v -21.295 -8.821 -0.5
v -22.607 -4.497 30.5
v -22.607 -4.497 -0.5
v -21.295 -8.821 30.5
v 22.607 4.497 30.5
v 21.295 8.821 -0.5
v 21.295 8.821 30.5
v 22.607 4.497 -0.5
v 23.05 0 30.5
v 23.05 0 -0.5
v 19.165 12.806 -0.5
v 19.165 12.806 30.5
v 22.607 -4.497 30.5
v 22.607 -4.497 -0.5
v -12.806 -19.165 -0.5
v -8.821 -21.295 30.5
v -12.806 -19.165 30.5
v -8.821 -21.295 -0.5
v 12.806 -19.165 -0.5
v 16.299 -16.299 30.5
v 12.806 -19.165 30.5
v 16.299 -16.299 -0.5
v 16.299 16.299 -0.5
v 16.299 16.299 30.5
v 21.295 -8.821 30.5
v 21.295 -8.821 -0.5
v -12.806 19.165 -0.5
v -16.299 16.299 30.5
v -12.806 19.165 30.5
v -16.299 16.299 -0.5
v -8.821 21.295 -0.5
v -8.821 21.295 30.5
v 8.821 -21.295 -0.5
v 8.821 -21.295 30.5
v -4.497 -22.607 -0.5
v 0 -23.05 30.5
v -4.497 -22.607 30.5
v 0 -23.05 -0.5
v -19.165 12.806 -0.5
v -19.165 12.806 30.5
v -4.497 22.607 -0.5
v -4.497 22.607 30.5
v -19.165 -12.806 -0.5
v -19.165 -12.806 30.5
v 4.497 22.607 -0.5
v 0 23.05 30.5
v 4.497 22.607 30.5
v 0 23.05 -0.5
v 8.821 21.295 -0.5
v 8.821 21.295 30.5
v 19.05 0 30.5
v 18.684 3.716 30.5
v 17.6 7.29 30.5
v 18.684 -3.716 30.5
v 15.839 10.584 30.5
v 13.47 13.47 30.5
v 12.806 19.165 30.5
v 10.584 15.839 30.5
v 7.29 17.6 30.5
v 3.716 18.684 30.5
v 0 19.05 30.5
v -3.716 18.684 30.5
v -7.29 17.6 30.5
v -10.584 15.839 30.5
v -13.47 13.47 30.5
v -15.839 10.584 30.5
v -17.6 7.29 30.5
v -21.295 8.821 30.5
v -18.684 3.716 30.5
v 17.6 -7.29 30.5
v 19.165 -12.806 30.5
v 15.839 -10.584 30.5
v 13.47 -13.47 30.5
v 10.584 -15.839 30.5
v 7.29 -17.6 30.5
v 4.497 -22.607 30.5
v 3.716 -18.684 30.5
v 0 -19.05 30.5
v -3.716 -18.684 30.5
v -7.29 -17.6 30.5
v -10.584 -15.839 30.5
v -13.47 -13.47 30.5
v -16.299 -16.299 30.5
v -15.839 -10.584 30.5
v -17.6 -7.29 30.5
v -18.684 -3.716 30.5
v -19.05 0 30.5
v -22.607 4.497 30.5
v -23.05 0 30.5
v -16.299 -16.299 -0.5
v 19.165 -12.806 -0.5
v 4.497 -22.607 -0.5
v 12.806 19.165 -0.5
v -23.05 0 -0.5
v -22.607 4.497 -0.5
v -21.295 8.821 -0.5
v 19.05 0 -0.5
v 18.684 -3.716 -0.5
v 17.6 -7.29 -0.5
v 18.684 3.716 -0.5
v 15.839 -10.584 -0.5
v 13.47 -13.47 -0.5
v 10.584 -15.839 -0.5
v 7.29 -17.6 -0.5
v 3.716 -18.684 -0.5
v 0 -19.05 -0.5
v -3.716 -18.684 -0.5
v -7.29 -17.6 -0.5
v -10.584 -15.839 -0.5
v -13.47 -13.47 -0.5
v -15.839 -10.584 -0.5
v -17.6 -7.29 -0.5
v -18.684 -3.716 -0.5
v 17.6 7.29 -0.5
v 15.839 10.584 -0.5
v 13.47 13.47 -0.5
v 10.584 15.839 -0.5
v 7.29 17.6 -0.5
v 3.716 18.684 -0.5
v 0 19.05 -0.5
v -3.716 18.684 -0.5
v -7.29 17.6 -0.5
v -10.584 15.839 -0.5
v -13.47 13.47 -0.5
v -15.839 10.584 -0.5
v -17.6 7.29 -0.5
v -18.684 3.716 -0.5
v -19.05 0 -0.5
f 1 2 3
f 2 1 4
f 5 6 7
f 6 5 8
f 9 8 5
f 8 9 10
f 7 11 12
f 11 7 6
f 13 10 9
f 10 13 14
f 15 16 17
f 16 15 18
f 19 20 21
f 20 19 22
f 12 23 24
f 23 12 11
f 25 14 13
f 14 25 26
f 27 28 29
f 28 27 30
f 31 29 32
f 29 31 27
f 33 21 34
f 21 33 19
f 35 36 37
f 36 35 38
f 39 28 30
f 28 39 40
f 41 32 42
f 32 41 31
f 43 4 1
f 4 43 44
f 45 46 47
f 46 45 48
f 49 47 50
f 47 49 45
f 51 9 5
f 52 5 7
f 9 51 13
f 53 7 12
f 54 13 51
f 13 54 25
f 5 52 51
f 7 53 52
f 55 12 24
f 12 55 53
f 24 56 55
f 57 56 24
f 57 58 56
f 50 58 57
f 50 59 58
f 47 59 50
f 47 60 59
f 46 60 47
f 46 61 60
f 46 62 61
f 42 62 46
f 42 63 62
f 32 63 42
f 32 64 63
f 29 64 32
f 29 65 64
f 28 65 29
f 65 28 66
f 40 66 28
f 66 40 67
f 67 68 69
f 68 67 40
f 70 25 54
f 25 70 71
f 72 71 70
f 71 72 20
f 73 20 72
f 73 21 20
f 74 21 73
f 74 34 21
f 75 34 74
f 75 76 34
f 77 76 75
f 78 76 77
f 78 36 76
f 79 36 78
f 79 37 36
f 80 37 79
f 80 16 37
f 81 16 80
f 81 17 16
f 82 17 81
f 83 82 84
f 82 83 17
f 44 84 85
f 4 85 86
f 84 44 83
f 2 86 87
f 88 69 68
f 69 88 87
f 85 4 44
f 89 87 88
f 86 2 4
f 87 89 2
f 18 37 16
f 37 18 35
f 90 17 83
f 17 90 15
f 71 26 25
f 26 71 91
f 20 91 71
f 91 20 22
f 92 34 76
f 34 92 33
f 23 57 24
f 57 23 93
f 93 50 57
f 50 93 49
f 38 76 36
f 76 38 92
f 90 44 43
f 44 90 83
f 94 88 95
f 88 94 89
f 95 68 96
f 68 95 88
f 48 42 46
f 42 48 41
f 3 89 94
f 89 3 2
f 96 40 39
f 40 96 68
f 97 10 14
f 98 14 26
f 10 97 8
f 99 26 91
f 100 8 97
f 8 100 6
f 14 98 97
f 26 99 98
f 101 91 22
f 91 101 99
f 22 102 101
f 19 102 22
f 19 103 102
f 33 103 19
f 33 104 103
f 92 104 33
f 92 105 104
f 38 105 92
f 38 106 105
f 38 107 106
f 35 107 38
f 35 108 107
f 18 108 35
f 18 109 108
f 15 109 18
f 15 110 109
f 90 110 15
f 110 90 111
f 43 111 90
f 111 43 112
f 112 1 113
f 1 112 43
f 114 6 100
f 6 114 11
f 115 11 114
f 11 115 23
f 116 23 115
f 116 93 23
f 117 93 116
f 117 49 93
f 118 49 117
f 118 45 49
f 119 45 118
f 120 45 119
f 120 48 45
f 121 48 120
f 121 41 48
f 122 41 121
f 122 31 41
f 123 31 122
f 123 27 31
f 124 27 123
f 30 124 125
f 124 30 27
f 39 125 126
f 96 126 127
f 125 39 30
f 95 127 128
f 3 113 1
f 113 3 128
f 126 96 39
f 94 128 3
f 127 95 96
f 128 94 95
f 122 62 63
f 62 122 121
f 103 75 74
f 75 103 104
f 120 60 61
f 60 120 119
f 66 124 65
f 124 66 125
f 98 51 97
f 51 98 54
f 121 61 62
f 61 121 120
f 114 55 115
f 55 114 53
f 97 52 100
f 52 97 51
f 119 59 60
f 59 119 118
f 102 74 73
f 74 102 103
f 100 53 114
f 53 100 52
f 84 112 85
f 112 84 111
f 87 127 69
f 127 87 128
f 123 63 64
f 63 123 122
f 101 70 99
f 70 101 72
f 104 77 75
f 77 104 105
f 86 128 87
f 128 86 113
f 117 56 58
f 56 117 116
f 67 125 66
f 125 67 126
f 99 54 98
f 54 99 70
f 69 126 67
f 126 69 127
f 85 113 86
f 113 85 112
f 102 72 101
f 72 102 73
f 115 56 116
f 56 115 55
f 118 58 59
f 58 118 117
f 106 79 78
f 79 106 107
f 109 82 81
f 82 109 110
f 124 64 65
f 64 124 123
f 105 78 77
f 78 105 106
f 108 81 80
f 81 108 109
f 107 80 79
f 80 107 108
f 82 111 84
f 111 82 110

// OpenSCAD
$fn = 32;

// ----------------------------------------------------------------------
// Two-module gear rim: z20 m2 and z18 m1.2, 30 mm wide
// ----------------------------------------------------------------------

// --- parameters (mm) ---
module_a = 2;             // first tooth module
teeth_a = 20;             // first band tooth count
module_b = 1.2;           // second tooth module
teeth_b = 18;             // second band tooth count
band_h = 12;              // height of one tooth band
web_t = 6;                // web thickness between the bands
total = 30;               // overall width over both bands
root_r = 17.5;            // root radius of the coarse band
hub_r = 23.05;            // hub radius
bore_d = 38.1;            // hub bore
hole_count = 6;           // lightening holes
hole_r = 11.98;           // lightening hole circle radius
hole_d = 4.96;            // lightening hole diameter

band_a = [[17.424, -1.631], [19.832, -1.598], [20.912, -1.227], [21.989, -0.695], [21.989, 0.695], [20.912, 1.227], [19.832, 1.598], [17.424, 1.631], [17.075, 3.833], [19.355, 4.609], [20.268, 5.295], [21.128, 6.134], [20.698, 7.456], [19.509, 7.629], [18.367, 7.648], [16.067, 6.935], [15.055, 8.922], [16.983, 10.364], [17.639, 11.299], [18.198, 12.363], [17.381, 13.487], [16.197, 13.284], [15.105, 12.949], [13.138, 11.561], [11.561, 13.138], [12.949, 15.105], [13.284, 16.197], [13.487, 17.381], [12.363, 18.198], [11.299, 17.639], [10.364, 16.983], [8.922, 15.055], [6.935, 16.067], [7.648, 18.367], [7.629, 19.509], [7.456, 20.698], [6.134, 21.128], [5.295, 20.268], [4.609, 19.355], [3.833, 17.075], [1.631, 17.424], [1.598, 19.832], [1.227, 20.912], [0.695, 21.989], [-0.695, 21.989], [-1.227, 20.912], [-1.598, 19.832], [-1.631, 17.424], [-3.833, 17.075], [-4.609, 19.355], [-5.295, 20.268], [-6.134, 21.128], [-7.456, 20.698], [-7.629, 19.509], [-7.648, 18.367], [-6.935, 16.067], [-8.922, 15.055], [-10.364, 16.983], [-11.299, 17.639], [-12.363, 18.198], [-13.487, 17.381], [-13.284, 16.197], [-12.949, 15.105], [-11.561, 13.138], [-13.138, 11.561], [-15.105, 12.949], [-16.197, 13.284], [-17.381, 13.487], [-18.198, 12.363], [-17.639, 11.299], [-16.983, 10.364], [-15.055, 8.922], [-16.067, 6.935], [-18.367, 7.648], [-19.509, 7.629], [-20.698, 7.456], [-21.128, 6.134], [-20.268, 5.295], [-19.355, 4.609], [-17.075, 3.833], [-17.424, 1.631], [-19.832, 1.598], [-20.912, 1.227], [-21.989, 0.695], [-21.989, -0.695], [-20.912, -1.227], [-19.832, -1.598], [-17.424, -1.631], [-17.075, -3.833], [-19.355, -4.609], [-20.268, -5.295], [-21.128, -6.134], [-20.698, -7.456], [-19.509, -7.629], [-18.367, -7.648], [-16.067, -6.935], [-15.055, -8.922], [-16.983, -10.364], [-17.639, -11.299], [-18.198, -12.363], [-17.381, -13.487], [-16.197, -13.284], [-15.105, -12.949], [-13.138, -11.561], [-11.561, -13.138], [-12.949, -15.105], [-13.284, -16.197], [-13.487, -17.381], [-12.363, -18.198], [-11.299, -17.639], [-10.364, -16.983], [-8.922, -15.055], [-6.935, -16.067], [-7.648, -18.367], [-7.629, -19.509], [-7.456, -20.698], [-6.134, -21.128], [-5.295, -20.268], [-4.609, -19.355], [-3.833, -17.075], [-1.631, -17.424], [-1.598, -19.832], [-1.227, -20.912], [-0.695, -21.989], [0.695, -21.989], [1.227, -20.912], [1.598, -19.832], [1.631, -17.424], [3.833, -17.075], [4.609, -19.355], [5.295, -20.268], [6.134, -21.128], [7.456, -20.698], [7.629, -19.509], [7.648, -18.367], [6.935, -16.067], [8.922, -15.055], [10.364, -16.983], [11.299, -17.639], [12.363, -18.198], [13.487, -17.381], [13.284, -16.197], [12.949, -15.105], [11.561, -13.138], [13.138, -11.561], [15.105, -12.949], [16.197, -13.284], [17.381, -13.487], [18.198, -12.363], [17.639, -11.299], [16.983, -10.364], [15.055, -8.922], [16.067, -6.935], [18.367, -7.648], [19.509, -7.629], [20.698, -7.456], [21.128, -6.134], [20.268, -5.295], [19.355, -4.609], [17.075, -3.833]];
band_b = [[9.252, -0.946], [10.758, -0.942], [11.377, -0.723], [11.993, -0.409], [11.993, 0.409], [11.377, 0.723], [10.758, 0.942], [9.252, 0.946], [9.017, 2.276], [10.431, 2.795], [10.938, 3.212], [11.41, 3.718], [11.13, 4.486], [10.443, 4.57], [9.787, 4.564], [8.37, 4.053], [7.695, 5.223], [8.846, 6.194], [9.18, 6.759], [9.45, 7.396], [8.924, 8.022], [8.25, 7.867], [7.636, 7.636], [6.48, 6.671], [5.445, 7.54], [6.194, 8.846], [6.314, 9.491], [6.351, 10.182], [5.642, 10.591], [5.062, 10.214], [4.564, 9.787], [3.807, 8.485], [2.538, 8.947], [2.795, 10.431], [2.687, 11.078], [2.485, 11.74], [1.68, 11.882], [1.264, 11.329], [0.941, 10.758], [0.675, 9.275], [-0.675, 9.275], [-0.941, 10.758], [-1.264, 11.329], [-1.68, 11.882], [-2.485, 11.74], [-2.687, 11.078], [-2.795, 10.431], [-2.538, 8.947], [-3.807, 8.485], [-4.564, 9.787], [-5.062, 10.214], [-5.642, 10.591], [-6.351, 10.182], [-6.314, 9.491], [-6.194, 8.846], [-5.445, 7.54], [-6.48, 6.671], [-7.636, 7.636], [-8.25, 7.867], [-8.924, 8.022], [-9.45, 7.396], [-9.18, 6.759], [-8.846, 6.194], [-7.695, 5.223], [-8.37, 4.053], [-9.787, 4.564], [-10.443, 4.57], [-11.13, 4.486], [-11.41, 3.718], [-10.938, 3.212], [-10.431, 2.795], [-9.017, 2.276], [-9.252, 0.946], [-10.758, 0.942], [-11.377, 0.723], [-11.993, 0.409], [-11.993, -0.409], [-11.377, -0.723], [-10.758, -0.942], [-9.252, -0.946], [-9.017, -2.276], [-10.431, -2.795], [-10.938, -3.212], [-11.41, -3.718], [-11.13, -4.486], [-10.443, -4.57], [-9.787, -4.564], [-8.37, -4.053], [-7.695, -5.223], [-8.846, -6.194], [-9.18, -6.759], [-9.45, -7.396], [-8.924, -8.022], [-8.25, -7.867], [-7.636, -7.636], [-6.48, -6.671], [-5.445, -7.54], [-6.194, -8.846], [-6.314, -9.491], [-6.351, -10.182], [-5.642, -10.591], [-5.062, -10.214], [-4.564, -9.787], [-3.807, -8.485], [-2.538, -8.947], [-2.795, -10.431], [-2.687, -11.078], [-2.485, -11.74], [-1.68, -11.882], [-1.264, -11.329], [-0.941, -10.758], [-0.675, -9.275], [0.675, -9.275], [0.941, -10.758], [1.264, -11.329], [1.68, -11.882], [2.485, -11.74], [2.687, -11.078], [2.795, -10.431], [2.538, -8.947], [3.807, -8.485], [4.564, -9.787], [5.062, -10.214], [5.642, -10.591], [6.351, -10.182], [6.314, -9.491], [6.194, -8.846], [5.445, -7.54], [6.48, -6.671], [7.636, -7.636], [8.25, -7.867], [8.924, -8.022], [9.45, -7.396], [9.18, -6.759], [8.846, -6.194], [7.695, -5.223], [8.37, -4.053], [9.787, -4.564], [10.443, -4.57], [11.13, -4.486], [11.41, -3.718], [10.938, -3.212], [10.431, -2.795], [9.017, -2.276]];

difference() {
  union() {
    /* tooth band A, overlapping the web by 0.4 mm */
    linear_extrude(height = band_h + 0.4) polygon(band_a);
    /* web */
    translate([0, 0, band_h - 0.4]) cylinder(h = web_t + 0.8, d = 2 * root_r);
    /* tooth band B */
    translate([0, 0, band_h + web_t]) linear_extrude(height = band_h + 0.4) polygon(band_b);
    /* hub */
    translate([0, 0, -0.5]) cylinder(h = total + 1.0, d = 2 * hub_r);
  }
  /* bore */
  translate([0, 0, -2.5]) cylinder(h = total + 5, d = bore_d);
  /* lightening holes through the web */
  for (i = [0 : hole_count - 1]) {
    a = i * 360 / hole_count;
    translate([hole_r * cos(a), hole_r * sin(a), -2.5]) cylinder(h = total + 5, d = hole_d);
  }
}
